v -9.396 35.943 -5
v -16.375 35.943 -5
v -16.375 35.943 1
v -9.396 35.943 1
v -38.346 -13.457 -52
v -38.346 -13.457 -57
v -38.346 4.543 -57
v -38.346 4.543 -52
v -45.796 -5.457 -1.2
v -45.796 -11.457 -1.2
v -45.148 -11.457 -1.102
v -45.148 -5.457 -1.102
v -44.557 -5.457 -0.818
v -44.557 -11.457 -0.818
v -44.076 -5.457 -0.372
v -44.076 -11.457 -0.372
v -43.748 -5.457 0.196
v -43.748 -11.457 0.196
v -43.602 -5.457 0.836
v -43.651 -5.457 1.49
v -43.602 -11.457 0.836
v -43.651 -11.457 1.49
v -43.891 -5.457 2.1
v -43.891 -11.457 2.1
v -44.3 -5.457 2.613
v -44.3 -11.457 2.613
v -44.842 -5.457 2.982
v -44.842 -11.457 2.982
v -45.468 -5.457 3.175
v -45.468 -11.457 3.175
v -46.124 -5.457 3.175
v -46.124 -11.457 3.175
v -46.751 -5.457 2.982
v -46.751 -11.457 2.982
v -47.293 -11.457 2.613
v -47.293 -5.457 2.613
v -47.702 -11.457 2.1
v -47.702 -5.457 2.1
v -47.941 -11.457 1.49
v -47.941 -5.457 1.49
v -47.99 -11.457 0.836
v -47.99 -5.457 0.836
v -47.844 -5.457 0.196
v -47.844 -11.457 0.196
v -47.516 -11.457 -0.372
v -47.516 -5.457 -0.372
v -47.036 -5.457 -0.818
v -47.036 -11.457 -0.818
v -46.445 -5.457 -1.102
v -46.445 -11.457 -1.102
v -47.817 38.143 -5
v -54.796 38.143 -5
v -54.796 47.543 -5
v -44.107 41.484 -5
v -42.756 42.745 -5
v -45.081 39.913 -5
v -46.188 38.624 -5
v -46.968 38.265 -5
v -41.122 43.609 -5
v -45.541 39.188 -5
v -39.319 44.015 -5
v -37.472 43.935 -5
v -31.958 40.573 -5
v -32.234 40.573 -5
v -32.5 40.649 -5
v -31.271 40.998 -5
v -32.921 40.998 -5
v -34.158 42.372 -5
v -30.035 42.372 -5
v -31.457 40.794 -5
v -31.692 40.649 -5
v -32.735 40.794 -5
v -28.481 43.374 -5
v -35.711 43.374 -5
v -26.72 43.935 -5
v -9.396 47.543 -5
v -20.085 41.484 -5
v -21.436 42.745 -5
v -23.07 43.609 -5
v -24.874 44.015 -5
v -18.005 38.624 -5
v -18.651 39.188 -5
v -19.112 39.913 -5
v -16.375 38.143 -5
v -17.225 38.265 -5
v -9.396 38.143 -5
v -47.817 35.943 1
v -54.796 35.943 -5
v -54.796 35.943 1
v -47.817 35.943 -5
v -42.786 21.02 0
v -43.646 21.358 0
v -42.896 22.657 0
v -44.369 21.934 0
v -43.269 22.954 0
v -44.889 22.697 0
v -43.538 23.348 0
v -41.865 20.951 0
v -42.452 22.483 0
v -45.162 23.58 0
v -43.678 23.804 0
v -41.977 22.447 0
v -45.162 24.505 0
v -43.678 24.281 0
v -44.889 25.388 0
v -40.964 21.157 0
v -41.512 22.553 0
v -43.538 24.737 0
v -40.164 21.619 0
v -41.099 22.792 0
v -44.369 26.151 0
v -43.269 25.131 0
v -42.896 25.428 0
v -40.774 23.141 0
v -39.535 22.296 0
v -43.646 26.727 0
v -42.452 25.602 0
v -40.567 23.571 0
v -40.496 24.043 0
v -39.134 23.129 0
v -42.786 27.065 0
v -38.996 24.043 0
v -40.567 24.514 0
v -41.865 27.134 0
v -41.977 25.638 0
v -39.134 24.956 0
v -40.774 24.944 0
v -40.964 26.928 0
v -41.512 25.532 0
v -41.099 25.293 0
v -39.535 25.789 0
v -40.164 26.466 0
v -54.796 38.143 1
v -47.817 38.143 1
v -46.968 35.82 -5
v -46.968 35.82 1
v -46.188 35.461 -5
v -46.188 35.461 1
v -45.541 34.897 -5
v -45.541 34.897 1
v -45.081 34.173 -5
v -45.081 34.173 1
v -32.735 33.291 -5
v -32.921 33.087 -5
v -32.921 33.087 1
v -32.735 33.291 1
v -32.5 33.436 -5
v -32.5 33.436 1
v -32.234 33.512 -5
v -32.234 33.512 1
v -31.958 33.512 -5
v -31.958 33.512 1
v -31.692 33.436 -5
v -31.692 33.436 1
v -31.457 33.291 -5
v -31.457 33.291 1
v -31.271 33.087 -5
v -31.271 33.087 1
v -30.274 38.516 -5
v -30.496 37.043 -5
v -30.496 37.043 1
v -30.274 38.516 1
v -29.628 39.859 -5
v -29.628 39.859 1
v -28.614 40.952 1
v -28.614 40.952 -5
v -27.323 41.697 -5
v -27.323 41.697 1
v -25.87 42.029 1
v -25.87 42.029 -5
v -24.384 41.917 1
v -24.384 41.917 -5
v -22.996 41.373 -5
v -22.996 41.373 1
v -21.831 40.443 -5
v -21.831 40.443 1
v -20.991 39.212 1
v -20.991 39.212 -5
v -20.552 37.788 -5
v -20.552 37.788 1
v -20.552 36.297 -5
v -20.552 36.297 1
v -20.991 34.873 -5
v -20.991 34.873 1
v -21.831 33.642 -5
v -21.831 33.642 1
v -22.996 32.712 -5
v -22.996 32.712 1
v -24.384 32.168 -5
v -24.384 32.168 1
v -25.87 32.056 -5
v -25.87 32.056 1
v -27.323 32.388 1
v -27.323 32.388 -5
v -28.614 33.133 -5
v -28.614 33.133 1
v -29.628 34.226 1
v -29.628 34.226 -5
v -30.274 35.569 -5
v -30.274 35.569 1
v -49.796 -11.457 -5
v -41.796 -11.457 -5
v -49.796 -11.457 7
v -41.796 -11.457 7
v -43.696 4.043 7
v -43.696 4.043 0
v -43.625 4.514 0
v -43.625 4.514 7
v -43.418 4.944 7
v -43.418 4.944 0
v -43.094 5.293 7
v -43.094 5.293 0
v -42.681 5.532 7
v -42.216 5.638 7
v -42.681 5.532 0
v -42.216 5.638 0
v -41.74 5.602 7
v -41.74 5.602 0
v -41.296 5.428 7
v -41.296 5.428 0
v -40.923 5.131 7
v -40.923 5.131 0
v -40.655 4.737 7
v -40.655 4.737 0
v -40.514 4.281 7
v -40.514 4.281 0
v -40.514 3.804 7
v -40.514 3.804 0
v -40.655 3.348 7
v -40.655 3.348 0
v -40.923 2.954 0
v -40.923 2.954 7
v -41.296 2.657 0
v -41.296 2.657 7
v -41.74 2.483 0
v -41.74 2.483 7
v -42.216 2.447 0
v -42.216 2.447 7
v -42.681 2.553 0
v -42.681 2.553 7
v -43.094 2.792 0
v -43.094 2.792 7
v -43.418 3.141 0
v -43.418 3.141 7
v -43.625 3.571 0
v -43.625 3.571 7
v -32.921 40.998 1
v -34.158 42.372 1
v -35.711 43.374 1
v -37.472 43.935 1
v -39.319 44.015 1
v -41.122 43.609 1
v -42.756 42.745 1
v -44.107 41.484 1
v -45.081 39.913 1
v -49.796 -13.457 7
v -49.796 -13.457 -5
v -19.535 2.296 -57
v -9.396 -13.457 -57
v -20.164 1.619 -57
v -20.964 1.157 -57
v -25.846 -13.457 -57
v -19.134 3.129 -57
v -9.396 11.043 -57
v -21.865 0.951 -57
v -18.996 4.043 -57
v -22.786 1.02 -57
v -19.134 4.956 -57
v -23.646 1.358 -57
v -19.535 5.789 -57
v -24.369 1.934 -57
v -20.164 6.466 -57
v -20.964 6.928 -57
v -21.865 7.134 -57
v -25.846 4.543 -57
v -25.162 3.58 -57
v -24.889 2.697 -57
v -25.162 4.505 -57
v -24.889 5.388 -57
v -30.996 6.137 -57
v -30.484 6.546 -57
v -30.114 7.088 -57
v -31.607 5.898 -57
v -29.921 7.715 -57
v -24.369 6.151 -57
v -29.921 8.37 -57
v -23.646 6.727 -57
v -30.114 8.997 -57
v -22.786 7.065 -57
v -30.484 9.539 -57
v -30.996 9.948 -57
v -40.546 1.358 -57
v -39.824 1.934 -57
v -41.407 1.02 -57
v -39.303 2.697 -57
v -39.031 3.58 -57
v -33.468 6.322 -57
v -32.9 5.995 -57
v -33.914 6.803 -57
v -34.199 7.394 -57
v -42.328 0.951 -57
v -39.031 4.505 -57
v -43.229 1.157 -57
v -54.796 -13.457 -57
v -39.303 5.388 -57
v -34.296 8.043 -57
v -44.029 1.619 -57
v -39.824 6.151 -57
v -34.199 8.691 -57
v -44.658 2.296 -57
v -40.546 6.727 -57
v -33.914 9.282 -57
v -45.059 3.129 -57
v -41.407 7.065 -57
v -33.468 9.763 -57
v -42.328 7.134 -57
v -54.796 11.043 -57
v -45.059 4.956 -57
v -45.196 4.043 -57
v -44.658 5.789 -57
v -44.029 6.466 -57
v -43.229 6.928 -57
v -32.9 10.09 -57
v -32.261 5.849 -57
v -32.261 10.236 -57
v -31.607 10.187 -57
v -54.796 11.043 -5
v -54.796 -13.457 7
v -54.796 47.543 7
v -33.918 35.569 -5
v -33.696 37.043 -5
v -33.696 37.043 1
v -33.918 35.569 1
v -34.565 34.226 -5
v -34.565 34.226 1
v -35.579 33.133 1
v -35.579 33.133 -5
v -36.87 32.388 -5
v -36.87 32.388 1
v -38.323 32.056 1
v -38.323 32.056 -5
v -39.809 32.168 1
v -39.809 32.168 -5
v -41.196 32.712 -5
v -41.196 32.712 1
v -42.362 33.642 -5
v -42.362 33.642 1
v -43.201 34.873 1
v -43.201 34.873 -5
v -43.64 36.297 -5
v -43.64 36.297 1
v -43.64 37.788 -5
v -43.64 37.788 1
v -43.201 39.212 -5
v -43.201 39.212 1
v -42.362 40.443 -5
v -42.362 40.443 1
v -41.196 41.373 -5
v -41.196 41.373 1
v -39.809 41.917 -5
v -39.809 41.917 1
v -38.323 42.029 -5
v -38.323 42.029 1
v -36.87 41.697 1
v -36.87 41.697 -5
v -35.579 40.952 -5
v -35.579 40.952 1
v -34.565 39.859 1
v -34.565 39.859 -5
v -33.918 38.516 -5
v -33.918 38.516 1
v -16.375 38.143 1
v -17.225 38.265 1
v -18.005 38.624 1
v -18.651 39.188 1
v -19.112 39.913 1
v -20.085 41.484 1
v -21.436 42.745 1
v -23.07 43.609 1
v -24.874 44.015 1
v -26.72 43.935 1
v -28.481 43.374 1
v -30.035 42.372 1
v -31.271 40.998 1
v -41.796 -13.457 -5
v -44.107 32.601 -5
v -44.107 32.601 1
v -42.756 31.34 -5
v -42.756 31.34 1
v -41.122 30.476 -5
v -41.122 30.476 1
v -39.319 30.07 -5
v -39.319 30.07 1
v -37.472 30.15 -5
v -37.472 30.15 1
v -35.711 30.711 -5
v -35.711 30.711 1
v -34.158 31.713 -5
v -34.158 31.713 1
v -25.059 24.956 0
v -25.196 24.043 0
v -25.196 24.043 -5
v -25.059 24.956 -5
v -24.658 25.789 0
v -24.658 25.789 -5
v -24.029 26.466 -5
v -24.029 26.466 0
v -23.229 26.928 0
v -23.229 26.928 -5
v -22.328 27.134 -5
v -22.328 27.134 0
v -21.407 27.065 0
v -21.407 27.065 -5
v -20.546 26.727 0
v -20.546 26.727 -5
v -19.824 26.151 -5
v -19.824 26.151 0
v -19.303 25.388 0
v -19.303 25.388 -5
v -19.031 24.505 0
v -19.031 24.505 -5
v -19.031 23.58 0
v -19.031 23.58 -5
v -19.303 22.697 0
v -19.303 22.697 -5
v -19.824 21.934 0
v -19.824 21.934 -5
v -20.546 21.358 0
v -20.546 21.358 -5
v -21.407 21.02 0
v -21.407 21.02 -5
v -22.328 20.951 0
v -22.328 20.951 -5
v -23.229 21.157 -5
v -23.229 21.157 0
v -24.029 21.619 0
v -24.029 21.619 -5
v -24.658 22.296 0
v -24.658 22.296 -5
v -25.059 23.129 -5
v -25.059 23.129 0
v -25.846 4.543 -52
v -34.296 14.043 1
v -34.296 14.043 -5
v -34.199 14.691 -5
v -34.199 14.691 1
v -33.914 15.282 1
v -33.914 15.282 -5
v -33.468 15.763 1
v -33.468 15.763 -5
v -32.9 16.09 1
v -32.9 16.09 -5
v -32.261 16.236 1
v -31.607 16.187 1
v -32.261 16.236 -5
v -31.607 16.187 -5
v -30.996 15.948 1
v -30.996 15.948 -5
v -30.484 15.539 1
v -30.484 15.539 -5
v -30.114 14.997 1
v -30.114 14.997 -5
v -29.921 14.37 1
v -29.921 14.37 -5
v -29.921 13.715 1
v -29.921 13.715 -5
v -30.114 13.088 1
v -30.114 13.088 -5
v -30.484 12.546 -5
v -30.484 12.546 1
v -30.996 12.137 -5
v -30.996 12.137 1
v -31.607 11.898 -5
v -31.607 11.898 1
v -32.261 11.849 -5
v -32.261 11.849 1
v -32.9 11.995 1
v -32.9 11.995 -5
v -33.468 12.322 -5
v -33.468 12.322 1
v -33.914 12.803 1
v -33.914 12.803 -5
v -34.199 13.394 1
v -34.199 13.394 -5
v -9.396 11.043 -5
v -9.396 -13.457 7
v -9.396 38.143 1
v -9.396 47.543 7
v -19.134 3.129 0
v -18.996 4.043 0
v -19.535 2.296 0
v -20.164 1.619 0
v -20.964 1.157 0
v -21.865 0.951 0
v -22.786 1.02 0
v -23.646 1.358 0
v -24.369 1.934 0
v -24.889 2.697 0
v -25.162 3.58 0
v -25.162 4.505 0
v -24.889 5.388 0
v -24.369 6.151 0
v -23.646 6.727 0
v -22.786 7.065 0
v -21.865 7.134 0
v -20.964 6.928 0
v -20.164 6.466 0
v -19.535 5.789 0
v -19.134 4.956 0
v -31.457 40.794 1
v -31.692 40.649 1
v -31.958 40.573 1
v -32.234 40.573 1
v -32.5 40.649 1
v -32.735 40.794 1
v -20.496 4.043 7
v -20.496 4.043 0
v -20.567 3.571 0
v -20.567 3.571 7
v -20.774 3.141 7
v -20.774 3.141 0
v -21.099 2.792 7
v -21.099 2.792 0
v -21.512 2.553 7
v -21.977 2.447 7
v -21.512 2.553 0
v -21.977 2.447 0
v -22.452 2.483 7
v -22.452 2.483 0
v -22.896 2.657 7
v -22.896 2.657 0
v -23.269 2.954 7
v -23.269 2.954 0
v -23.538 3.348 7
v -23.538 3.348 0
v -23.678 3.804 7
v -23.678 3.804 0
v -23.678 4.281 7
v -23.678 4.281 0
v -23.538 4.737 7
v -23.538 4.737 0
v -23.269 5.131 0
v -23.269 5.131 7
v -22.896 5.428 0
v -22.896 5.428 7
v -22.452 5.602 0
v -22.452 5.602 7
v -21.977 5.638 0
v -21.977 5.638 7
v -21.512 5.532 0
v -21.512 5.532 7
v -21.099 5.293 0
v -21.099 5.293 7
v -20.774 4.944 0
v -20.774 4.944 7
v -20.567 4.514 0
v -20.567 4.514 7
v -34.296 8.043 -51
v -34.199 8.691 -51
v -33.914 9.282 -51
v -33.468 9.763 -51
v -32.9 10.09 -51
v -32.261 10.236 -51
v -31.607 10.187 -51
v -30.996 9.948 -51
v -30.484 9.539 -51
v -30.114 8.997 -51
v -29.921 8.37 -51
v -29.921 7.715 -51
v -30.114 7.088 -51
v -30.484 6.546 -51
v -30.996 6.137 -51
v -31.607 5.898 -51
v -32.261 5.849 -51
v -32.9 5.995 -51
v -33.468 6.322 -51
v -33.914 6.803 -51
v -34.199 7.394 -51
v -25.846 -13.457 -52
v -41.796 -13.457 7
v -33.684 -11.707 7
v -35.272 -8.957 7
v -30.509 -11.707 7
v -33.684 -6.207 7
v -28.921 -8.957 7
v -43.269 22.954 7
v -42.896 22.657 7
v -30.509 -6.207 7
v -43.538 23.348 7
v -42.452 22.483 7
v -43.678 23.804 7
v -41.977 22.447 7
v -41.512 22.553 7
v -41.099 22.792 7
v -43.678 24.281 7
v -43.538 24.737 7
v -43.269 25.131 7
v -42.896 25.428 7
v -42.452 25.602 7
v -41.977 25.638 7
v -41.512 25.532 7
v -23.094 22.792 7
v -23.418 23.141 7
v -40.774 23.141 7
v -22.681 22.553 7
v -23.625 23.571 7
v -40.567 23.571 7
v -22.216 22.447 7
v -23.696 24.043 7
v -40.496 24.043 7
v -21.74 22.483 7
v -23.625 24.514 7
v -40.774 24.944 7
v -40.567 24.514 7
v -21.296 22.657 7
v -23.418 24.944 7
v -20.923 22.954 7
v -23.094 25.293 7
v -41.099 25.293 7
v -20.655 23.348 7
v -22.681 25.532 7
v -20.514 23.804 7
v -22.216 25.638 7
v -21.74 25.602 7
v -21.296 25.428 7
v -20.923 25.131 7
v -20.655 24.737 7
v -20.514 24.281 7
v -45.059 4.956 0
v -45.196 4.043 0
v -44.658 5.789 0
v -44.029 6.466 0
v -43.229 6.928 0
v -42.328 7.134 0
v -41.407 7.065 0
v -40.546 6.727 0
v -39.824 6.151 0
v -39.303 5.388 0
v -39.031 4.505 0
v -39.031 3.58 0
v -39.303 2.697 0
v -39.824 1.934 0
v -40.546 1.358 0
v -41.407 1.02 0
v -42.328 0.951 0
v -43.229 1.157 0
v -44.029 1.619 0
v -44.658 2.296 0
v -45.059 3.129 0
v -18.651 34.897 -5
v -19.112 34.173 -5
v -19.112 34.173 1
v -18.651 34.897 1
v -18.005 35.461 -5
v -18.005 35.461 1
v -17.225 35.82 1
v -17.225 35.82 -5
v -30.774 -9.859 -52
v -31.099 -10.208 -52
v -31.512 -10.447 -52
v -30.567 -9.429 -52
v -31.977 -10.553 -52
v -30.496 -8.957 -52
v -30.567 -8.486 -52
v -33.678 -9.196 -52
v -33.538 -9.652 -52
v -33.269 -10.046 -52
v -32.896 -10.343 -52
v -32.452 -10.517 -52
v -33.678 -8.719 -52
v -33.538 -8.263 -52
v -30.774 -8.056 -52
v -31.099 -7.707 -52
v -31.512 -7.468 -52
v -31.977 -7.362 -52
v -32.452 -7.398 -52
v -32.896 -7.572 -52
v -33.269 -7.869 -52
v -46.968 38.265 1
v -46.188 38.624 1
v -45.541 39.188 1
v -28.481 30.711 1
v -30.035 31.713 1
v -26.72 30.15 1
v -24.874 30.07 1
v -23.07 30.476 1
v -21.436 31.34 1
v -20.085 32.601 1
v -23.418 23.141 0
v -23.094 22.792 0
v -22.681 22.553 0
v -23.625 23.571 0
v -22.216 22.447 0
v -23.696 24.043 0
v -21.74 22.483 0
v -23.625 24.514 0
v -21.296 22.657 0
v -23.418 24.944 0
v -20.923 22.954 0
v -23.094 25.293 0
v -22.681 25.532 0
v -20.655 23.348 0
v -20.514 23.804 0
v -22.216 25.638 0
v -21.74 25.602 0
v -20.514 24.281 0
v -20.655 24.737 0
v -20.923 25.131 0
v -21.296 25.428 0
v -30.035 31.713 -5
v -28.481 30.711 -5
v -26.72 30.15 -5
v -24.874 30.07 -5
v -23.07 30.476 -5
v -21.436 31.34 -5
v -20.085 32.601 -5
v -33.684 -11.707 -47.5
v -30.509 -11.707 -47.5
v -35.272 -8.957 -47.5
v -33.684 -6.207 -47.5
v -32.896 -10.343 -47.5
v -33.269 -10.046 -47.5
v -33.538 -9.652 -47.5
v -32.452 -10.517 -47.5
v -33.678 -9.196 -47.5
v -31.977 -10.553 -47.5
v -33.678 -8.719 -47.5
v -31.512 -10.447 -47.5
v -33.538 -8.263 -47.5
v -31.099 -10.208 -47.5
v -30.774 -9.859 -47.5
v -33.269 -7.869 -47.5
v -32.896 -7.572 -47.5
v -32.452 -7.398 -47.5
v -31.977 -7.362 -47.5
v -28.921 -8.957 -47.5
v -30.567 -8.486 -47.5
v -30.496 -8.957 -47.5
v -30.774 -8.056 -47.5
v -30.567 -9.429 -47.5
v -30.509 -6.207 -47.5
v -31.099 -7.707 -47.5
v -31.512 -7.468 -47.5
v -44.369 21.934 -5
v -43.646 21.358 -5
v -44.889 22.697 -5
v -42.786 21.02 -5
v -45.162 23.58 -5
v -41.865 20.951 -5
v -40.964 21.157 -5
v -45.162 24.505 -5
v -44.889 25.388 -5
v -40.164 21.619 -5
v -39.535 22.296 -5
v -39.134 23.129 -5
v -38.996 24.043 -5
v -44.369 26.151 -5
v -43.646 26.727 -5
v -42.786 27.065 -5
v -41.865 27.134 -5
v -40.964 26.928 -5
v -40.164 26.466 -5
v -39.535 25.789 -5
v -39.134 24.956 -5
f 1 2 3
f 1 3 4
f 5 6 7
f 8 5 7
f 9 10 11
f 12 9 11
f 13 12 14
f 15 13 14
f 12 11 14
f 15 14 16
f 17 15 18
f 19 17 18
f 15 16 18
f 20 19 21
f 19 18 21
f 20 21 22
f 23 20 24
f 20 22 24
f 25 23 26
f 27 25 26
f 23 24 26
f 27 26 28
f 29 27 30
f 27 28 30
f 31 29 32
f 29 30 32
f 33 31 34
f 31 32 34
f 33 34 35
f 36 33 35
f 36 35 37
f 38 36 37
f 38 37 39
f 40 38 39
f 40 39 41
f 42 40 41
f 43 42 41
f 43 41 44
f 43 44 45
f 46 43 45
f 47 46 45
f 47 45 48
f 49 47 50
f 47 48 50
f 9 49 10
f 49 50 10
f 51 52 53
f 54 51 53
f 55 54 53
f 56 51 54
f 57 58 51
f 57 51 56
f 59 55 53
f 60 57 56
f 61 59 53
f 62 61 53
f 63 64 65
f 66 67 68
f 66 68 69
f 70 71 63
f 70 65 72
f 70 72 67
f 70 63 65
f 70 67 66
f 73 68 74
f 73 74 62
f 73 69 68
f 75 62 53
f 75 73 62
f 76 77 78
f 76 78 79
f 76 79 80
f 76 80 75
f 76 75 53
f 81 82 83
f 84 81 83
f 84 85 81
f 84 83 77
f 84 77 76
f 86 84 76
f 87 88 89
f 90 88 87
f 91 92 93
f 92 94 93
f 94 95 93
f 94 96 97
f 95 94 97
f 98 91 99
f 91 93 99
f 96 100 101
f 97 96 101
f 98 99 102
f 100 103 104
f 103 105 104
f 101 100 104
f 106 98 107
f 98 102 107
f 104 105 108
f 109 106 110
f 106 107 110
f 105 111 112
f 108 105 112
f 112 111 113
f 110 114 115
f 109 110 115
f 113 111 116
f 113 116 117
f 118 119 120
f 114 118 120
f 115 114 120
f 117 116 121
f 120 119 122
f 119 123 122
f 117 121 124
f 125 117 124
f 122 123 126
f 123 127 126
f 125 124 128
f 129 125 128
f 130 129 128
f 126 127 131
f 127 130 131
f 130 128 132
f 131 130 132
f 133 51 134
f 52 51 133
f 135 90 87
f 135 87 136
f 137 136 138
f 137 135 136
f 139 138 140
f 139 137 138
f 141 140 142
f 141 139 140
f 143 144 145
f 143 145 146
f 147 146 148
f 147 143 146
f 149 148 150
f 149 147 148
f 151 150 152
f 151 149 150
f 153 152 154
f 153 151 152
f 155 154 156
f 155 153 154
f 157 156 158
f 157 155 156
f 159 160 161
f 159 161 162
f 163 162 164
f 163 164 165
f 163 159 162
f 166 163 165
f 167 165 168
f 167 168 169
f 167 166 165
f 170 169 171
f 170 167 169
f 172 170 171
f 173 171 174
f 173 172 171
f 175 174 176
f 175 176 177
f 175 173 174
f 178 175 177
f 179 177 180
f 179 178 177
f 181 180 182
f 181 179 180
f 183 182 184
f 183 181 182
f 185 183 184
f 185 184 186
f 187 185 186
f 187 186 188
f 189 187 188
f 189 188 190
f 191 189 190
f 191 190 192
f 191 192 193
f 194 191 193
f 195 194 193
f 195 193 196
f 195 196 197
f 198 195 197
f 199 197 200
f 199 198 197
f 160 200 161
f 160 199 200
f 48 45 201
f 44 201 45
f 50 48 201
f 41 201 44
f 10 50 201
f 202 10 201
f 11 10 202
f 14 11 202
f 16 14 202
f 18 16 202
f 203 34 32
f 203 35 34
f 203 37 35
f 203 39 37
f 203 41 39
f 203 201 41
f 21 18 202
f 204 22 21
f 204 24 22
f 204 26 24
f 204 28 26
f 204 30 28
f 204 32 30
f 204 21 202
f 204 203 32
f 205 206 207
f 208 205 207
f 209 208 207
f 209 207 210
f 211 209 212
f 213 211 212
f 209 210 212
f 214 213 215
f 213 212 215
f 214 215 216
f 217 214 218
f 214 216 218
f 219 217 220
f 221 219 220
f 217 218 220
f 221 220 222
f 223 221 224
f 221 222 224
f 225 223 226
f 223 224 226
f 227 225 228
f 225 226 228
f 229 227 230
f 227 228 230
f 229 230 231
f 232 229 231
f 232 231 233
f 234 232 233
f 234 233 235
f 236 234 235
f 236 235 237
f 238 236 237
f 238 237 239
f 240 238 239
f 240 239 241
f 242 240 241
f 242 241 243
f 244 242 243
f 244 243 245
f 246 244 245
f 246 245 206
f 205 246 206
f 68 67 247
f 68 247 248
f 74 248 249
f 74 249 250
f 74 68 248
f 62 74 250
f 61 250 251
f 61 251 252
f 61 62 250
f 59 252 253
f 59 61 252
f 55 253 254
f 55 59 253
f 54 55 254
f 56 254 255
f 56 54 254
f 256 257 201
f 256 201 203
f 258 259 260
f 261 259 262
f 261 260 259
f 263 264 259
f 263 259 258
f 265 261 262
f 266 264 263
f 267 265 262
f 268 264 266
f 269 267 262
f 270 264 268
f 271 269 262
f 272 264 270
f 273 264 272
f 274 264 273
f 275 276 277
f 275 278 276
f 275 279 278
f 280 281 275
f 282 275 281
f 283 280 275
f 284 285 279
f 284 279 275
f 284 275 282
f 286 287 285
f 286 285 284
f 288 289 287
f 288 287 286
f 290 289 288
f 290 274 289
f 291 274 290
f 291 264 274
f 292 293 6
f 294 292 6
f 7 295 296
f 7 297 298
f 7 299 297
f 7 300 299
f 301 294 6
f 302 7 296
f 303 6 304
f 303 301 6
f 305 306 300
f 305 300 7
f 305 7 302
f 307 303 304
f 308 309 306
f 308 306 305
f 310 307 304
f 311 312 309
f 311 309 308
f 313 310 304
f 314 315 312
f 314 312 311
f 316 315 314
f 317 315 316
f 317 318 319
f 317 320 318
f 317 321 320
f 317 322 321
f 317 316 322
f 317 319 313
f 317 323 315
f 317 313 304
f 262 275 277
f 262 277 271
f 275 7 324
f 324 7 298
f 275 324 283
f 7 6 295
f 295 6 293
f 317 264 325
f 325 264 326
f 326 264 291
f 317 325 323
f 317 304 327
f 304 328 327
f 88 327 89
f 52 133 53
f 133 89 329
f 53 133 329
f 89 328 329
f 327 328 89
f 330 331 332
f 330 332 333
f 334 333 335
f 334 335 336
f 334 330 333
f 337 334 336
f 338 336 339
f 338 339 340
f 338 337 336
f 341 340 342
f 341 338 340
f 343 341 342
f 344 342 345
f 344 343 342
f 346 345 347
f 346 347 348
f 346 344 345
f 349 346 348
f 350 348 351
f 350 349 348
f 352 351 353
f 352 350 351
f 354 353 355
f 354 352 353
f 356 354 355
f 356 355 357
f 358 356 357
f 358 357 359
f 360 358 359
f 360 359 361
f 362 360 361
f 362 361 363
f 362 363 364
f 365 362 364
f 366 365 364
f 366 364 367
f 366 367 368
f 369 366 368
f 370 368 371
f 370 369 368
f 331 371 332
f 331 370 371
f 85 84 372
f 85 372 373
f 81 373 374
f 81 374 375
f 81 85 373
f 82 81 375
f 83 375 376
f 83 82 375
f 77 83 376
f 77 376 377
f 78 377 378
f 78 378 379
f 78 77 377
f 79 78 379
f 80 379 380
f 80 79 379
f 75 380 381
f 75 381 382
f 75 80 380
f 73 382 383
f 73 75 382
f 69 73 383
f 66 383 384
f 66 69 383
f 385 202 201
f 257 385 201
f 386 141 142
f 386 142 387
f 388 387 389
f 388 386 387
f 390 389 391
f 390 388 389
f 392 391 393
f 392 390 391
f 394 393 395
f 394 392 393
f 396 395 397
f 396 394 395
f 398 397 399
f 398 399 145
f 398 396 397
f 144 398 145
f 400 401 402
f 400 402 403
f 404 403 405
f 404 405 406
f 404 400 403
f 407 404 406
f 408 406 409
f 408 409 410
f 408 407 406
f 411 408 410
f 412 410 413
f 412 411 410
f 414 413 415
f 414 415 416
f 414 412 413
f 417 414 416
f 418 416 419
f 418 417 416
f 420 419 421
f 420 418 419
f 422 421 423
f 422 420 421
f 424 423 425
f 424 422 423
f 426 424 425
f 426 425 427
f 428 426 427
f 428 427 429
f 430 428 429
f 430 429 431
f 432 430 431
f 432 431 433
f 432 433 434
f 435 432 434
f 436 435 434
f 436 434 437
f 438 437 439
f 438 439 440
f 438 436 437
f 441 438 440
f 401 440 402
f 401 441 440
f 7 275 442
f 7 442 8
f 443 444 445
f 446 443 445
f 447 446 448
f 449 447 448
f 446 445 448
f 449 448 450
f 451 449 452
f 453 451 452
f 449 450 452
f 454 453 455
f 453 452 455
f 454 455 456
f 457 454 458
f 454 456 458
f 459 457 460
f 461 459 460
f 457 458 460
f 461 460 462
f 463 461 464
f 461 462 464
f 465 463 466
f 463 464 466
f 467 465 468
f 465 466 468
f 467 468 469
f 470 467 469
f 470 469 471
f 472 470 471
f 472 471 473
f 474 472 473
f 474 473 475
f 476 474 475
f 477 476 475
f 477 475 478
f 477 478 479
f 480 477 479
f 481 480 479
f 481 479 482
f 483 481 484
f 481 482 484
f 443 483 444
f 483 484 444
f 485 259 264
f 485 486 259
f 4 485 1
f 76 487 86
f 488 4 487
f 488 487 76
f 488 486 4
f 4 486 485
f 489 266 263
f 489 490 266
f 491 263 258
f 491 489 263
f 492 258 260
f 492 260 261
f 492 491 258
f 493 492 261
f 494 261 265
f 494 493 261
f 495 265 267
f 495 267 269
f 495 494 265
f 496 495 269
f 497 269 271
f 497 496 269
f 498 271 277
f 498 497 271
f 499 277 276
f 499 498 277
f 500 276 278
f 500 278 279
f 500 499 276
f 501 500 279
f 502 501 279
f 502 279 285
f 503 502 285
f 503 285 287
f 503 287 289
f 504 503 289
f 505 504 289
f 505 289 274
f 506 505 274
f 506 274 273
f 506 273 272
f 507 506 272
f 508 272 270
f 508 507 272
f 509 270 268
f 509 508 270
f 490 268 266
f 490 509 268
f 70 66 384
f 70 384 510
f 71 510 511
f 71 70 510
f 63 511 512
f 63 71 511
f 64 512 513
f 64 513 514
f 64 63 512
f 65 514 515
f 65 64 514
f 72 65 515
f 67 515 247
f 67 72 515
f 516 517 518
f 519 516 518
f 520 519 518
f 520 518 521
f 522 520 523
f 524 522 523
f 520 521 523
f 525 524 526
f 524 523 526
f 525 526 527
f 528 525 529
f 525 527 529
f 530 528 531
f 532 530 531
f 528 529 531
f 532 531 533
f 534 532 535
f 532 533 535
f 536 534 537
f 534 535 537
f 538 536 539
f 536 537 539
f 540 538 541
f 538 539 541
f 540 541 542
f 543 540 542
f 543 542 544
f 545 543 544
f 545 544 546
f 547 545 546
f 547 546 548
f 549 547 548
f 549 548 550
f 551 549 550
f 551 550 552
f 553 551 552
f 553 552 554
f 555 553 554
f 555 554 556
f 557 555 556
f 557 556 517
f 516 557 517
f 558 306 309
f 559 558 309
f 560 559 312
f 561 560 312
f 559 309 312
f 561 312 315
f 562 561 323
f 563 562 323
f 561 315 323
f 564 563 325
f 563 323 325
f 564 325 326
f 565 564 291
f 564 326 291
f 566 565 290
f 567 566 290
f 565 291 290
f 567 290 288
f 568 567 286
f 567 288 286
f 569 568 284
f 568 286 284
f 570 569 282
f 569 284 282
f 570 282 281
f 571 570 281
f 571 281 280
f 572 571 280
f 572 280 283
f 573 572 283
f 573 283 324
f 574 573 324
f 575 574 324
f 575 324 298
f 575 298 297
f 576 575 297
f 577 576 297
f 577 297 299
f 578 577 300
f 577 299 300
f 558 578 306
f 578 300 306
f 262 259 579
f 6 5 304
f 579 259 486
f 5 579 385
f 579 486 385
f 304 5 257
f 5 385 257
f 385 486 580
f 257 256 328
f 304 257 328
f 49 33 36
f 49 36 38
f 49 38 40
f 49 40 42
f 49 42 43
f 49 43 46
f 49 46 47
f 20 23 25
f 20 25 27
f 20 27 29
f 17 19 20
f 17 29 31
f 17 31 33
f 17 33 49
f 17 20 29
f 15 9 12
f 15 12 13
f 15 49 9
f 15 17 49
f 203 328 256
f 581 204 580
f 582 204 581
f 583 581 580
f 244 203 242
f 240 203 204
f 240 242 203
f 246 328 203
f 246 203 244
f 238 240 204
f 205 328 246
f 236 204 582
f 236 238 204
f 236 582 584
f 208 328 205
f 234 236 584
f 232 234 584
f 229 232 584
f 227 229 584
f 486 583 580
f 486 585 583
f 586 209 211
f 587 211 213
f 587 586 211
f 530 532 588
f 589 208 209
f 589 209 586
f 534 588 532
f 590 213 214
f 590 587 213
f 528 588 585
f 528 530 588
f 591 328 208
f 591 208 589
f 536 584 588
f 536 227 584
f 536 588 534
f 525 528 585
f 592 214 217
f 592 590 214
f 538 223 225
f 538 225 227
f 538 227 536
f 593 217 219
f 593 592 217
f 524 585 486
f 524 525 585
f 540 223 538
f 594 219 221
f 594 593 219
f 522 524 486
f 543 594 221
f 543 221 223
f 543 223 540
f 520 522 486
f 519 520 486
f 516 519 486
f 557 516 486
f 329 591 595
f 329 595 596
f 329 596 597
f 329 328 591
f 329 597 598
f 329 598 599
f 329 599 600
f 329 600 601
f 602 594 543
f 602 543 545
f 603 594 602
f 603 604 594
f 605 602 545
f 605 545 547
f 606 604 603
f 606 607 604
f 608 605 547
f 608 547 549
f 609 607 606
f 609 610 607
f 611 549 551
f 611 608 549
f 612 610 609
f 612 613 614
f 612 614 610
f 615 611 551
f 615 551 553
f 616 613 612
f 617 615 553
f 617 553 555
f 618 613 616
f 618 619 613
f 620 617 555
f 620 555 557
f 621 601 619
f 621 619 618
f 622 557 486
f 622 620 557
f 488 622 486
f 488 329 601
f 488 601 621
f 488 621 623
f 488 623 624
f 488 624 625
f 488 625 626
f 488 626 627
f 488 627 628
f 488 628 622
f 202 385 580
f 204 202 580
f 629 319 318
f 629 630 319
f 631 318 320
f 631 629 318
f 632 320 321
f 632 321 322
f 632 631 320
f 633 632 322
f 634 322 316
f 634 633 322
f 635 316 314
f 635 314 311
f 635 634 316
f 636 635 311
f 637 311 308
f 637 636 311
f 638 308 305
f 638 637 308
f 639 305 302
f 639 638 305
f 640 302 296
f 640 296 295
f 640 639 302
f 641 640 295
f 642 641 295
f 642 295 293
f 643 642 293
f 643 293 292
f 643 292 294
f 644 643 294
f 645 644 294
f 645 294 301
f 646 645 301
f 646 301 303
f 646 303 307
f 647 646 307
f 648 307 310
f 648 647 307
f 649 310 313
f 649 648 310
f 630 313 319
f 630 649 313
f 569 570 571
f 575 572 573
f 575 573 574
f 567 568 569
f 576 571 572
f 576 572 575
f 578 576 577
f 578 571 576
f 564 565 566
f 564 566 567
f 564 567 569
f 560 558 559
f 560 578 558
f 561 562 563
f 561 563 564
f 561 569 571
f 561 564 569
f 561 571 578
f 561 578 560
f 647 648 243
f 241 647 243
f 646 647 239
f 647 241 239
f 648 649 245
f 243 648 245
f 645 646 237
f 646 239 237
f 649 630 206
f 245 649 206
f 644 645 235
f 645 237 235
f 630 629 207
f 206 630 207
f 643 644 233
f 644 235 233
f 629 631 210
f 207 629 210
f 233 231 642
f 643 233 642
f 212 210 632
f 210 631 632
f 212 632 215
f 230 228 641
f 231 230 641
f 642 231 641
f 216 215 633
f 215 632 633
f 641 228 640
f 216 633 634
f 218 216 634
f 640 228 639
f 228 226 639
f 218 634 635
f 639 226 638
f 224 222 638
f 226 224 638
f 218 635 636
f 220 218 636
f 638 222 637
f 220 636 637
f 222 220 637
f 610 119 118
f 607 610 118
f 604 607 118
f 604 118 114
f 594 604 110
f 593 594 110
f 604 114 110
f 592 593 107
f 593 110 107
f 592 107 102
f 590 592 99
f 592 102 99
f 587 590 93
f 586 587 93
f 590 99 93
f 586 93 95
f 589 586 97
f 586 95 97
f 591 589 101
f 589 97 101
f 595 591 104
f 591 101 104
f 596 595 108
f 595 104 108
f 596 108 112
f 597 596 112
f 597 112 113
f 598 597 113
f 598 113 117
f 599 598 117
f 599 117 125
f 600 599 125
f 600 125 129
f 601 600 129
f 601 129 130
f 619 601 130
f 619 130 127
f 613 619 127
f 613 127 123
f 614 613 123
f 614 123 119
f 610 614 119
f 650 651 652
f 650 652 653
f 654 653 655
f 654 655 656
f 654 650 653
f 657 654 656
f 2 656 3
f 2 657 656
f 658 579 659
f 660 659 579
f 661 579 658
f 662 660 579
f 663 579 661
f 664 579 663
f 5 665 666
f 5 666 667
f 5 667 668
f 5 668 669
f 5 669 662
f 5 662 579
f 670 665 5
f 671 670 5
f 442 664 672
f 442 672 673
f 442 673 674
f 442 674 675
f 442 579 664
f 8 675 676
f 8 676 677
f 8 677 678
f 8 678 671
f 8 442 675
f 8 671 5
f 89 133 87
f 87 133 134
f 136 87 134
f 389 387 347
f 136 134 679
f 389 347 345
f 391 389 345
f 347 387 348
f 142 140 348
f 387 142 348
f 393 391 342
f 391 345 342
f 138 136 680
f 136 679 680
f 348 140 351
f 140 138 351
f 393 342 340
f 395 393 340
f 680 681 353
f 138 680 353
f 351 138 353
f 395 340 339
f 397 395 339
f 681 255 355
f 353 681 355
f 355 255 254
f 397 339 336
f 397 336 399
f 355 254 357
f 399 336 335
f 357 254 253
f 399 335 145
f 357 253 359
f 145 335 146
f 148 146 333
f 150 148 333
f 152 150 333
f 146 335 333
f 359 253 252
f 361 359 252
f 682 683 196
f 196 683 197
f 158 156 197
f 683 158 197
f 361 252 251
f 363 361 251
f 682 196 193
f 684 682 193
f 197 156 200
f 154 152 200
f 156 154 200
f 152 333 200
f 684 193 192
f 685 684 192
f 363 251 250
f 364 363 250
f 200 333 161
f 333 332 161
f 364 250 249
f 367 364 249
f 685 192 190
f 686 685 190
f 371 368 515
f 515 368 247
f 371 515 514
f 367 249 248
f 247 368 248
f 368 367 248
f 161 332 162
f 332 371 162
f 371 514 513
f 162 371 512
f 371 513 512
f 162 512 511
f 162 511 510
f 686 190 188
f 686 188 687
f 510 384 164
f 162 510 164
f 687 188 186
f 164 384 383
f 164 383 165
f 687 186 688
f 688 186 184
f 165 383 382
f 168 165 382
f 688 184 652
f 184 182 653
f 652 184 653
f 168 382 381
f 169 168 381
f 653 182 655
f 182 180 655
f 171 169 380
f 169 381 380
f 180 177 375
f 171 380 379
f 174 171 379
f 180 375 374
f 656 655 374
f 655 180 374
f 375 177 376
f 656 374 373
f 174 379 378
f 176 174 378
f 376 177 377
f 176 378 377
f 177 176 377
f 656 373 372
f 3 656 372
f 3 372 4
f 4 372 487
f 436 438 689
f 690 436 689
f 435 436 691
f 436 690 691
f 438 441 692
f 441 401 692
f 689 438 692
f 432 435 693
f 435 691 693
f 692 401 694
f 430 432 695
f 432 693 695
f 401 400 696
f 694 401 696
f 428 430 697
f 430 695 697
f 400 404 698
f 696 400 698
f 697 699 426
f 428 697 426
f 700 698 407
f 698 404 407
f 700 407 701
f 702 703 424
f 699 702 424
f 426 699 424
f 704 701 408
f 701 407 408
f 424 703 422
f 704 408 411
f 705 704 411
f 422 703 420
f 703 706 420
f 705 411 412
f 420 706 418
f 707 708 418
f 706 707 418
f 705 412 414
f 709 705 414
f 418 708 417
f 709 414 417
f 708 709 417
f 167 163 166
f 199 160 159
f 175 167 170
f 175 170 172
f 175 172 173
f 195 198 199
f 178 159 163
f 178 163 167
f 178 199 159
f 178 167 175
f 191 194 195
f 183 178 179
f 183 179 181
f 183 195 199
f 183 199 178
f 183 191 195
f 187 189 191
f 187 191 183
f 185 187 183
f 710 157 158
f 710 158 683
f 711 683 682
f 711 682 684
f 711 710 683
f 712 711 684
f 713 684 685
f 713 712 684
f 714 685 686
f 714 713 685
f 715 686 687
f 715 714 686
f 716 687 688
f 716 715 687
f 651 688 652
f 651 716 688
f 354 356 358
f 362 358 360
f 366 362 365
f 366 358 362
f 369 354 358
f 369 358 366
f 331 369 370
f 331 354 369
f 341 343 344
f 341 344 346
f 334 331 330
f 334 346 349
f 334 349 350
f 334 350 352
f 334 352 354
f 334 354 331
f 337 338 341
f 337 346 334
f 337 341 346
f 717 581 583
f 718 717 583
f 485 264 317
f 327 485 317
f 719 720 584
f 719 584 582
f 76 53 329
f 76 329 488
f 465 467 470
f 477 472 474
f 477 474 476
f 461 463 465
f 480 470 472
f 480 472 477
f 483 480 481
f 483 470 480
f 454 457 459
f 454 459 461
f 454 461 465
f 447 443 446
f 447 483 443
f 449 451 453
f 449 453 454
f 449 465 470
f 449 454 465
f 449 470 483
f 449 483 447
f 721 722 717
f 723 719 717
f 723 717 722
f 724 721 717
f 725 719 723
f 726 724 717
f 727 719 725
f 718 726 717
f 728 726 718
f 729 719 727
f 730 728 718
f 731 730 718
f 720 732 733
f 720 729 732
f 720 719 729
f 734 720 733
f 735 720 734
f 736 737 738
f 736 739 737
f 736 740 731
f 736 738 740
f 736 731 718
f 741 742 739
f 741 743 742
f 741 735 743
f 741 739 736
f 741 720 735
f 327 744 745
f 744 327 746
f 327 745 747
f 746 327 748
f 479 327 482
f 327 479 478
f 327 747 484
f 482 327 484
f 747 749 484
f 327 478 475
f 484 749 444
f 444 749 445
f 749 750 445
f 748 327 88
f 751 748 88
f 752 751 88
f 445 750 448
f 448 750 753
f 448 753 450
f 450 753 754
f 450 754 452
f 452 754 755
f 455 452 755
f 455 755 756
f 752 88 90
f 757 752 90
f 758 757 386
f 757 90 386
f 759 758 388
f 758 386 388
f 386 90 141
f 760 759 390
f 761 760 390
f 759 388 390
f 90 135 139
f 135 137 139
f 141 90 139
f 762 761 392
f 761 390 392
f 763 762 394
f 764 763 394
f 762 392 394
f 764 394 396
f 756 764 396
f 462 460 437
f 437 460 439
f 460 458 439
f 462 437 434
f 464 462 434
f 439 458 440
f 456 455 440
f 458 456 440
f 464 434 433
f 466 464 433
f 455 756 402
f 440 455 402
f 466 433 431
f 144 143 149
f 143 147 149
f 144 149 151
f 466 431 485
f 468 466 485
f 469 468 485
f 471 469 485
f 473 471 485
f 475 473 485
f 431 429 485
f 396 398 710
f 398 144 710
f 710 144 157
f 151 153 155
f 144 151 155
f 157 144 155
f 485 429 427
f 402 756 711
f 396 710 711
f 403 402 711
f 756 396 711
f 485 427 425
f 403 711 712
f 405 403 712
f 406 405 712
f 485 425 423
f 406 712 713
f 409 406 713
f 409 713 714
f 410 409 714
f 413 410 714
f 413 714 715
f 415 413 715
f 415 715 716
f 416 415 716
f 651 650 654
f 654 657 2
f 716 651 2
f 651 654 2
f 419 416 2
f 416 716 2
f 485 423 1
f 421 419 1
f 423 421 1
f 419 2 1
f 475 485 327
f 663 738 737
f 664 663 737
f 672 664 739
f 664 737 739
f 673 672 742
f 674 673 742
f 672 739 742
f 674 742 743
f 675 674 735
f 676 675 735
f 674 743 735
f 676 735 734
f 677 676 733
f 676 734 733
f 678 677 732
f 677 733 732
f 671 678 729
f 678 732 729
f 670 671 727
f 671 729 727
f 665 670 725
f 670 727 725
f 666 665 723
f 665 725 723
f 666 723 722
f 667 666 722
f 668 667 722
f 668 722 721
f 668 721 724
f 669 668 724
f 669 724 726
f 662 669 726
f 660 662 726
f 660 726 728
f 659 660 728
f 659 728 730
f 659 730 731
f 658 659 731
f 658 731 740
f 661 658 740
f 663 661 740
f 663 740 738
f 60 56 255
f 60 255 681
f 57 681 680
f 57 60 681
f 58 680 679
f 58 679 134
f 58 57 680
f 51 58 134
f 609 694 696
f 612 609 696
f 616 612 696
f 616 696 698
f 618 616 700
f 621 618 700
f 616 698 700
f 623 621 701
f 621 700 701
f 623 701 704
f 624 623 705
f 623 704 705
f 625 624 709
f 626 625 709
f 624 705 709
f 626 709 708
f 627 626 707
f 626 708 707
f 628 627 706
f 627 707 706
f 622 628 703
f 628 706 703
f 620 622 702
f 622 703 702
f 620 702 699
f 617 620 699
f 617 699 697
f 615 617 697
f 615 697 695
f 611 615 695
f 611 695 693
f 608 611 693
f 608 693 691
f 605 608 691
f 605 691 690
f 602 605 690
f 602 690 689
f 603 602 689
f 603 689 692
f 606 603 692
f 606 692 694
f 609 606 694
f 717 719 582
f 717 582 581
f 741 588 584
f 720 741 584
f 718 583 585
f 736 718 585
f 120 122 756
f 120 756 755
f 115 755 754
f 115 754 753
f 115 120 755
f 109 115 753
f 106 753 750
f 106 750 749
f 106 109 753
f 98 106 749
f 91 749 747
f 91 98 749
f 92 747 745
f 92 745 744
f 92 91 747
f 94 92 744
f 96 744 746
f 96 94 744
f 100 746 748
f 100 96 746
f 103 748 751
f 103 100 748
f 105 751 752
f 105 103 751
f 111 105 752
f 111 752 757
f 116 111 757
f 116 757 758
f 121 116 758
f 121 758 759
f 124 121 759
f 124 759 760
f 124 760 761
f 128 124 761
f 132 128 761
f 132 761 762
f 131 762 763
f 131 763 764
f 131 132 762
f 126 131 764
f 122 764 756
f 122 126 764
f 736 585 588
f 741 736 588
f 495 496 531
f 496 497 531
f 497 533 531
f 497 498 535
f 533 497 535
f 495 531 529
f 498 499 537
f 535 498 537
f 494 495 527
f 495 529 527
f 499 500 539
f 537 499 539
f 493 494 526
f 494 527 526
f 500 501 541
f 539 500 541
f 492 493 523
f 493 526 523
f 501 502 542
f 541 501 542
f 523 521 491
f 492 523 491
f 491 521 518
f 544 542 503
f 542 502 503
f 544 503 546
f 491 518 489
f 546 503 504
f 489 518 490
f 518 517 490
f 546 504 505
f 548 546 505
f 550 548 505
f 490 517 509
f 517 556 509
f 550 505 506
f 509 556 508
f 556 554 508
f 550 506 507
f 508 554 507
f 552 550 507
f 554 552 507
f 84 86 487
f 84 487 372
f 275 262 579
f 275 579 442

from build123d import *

# Parameters (mm, degrees)
SKETCH_1_W           = 45.4
SKETCH_1_H           = 27
EXTRUDE_1_DEPTH      = 7
SKETCH_2_R           = 1.6
CUT_EXTRUDE_1_DEPTH  = 62.727033531
SKETCH_4_R           = 3.1
EXTRUDE_2_DEPTH      = 5
SKETCH_5_W           = 45.4
SKETCH_5_H           = 12
EXTRUDE_3_DEPTH      = 20
SKETCH_7_R           = 5
CUT_EXTRUDE_3_DEPTH  = 6
EXTRUDE_4_DEPTH      = 14
SKETCH_10_W          = 8
SKETCH_10_H          = 12
CUT_EXTRUDE_6_DEPTH  = 2
SKETCH_12_R          = 2.2
CUT_EXTRUDE_8_DEPTH  = 6
SKETCH_13_R          = 2.2
CUT_EXTRUDE_9_DEPTH  = 6
SKETCH_14_W          = 45.4
SKETCH_14_H          = 24.5
SKETCH_14_R          = 3.1
EXTRUDE_5_DEPTH      = 52
SKETCH_15_W          = 12.5
SKETCH_15_H          = 36
CUT_EXTRUDE_10_DEPTH = 5
SKETCH_9_R           = 1.6
CUT_EXTRUDE_4_DEPTH  = 97.741548345
CUT_EXTRUDE_5_DEPTH  = 54.5
SKETCH_16_R          = 2.2
CUT_EXTRUDE_11_DEPTH = 6


with BuildPart() as part:
    # 草图1 → 凸台-拉伸1 (new body)
    with BuildSketch(Plane.XY):
        with Locations((-32.096319797, 14.04251269)):
            Rectangle(SKETCH_1_W, SKETCH_1_H)
    extrude(amount=EXTRUDE_1_DEPTH)

    # 草图2 → 切除-拉伸1 (cut, through all)
    with BuildSketch(Plane(origin=(0, 0, 0), x_dir=(-1, 0, 0), z_dir=(0, 0, -1))):
        with Locations((22.096319797, 24.04251269)):
            Circle(SKETCH_2_R)
        with Locations(Location((42.096319797, 24.04251269, 0), (0, 0, 180))):
            Circle(SKETCH_2_R)
        with Locations((42.096319797, 4.04251269)):
            Circle(SKETCH_2_R)
        with Locations(Location((22.096319797, 4.04251269, 0), (0, 0, 180))):
            Circle(SKETCH_2_R)
    extrude(amount=-CUT_EXTRUDE_1_DEPTH, mode=Mode.SUBTRACT)

    # 草图4 → 凸台-拉伸2 (add)
    with BuildSketch(Plane(origin=(0, 0, 0), x_dir=(-1, 0, 0), z_dir=(0, 0, -1))):
        Polygon((38.346319797, 0.54251269), (54.796319797, 0.54251269), (54.796319797, 27.54251269), (9.396319797, 27.54251269), (9.396319797, 0.54251269), (25.846319797, 0.54251269), align=None)
        with Locations(Location((42.096319797, 24.04251269, 0), (0, 0, 180))):
            Circle(SKETCH_4_R, mode=Mode.SUBTRACT)
        with Locations((22.096319797, 24.04251269)):
            Circle(SKETCH_4_R, mode=Mode.SUBTRACT)
        with Locations((42.096319797, 4.04251269)):
            Circle(SKETCH_4_R, mode=Mode.SUBTRACT)
        with Locations(Location((22.096319797, 4.04251269, 0), (0, 0, 180))):
            Circle(SKETCH_4_R, mode=Mode.SUBTRACT)
    extrude(amount=EXTRUDE_2_DEPTH)

    # 草图5 → 凸台-拉伸3 (add)
    with BuildSketch(Plane(origin=(0, 27.54251269, 0), x_dir=(1, 0, 0), z_dir=(0, 1, 0))):
        with Locations((-32.096319797, -1)):
            Rectangle(SKETCH_5_W, SKETCH_5_H)
    extrude(amount=EXTRUDE_3_DEPTH)

    # 草图7 → 切除-拉伸3 (cut)
    with BuildSketch(Plane(origin=(0, 0, -5), x_dir=(-1, 0, 0), z_dir=(0, 0, -1))):
        with BuildLine():
            Line((9.396319797, 38.14251269), (16.375464574, 38.14251269))
            ThreePointArc((16.375464574, 38.14251269), (18.004881648, 38.623584347), (19.111721141, 39.91251269))
            ThreePointArc((19.111721141, 39.91251269), (24.873653651, 44.014763896), (31.271319797, 40.998441785))
            ThreePointArc((31.271319797, 40.998441785), (32.096319797, 40.563574513), (32.921319797, 40.998441785))
            ThreePointArc((32.921319797, 40.998441785), (39.318985943, 44.014763896), (45.080918453, 39.91251269))
            ThreePointArc((45.080918453, 39.91251269), (46.187757946, 38.623584347), (47.81717502, 38.14251269))
            Line((47.81717502, 38.14251269), (54.796319797, 38.14251269))
            Line((54.796319797, 38.14251269), (54.796319797, 35.94251269))
            Line((54.796319797, 35.94251269), (47.81717502, 35.94251269))
            ThreePointArc((47.81717502, 35.94251269), (46.187757946, 35.461441034), (45.080918453, 34.17251269))
            ThreePointArc((45.080918453, 34.17251269), (39.318985943, 30.070261485), (32.921319797, 33.086583596))
            ThreePointArc((32.921319797, 33.086583596), (32.096319797, 33.521450868), (31.271319797, 33.086583596))
            ThreePointArc((31.271319797, 33.086583596), (24.873653651, 30.070261485), (19.111721141, 34.17251269))
            ThreePointArc((19.111721141, 34.17251269), (18.004881648, 35.461441034), (16.375464574, 35.94251269))
            Line((16.375464574, 35.94251269), (9.396319797, 35.94251269))
            Line((9.396319797, 35.94251269), (9.396319797, 38.14251269))
        make_face()
        with Locations((25.496319797, 37.04251269)):
            Circle(SKETCH_7_R, mode=Mode.SUBTRACT)
        with Locations(Location((38.696319797, 37.04251269, 0), (0, 0, 180))):
            Circle(SKETCH_7_R, mode=Mode.SUBTRACT)
    extrude(amount=-CUT_EXTRUDE_3_DEPTH, mode=Mode.SUBTRACT)

    # 草图8 → 凸台-拉伸4 (add)
    with BuildSketch(Plane.XZ.offset(-0.54251269)):
        Polygon((-54.796319797, 7), (-9.396319797, 7), (-9.396319797, -5), (-25.846319797, -5), (-38.346319797, -5), (-54.796319797, -5), align=None)
    extrude(amount=EXTRUDE_4_DEPTH)

    # 草图10 → 切除-拉伸6 (cut)
    with BuildSketch(Plane.XZ.offset(13.45748731)):
        with Locations((-45.796319797, 1)):
            Rectangle(SKETCH_10_W, SKETCH_10_H)
    extrude(amount=-CUT_EXTRUDE_6_DEPTH, mode=Mode.SUBTRACT)

    # 草图12 → 切除-拉伸8 (cut)
    with BuildSketch(Plane.XZ.offset(11.45748731)):
        with Locations(Location((-45.796319797, 1, 0), (0, 0, 270))):
            Circle(SKETCH_12_R)
    extrude(amount=-CUT_EXTRUDE_8_DEPTH, mode=Mode.SUBTRACT)

    # 草图13 → 切除-拉伸9 (cut)
    with BuildSketch(Plane(origin=(0, 0, -5), x_dir=(-1, 0, 0), z_dir=(0, 0, -1))):
        with Locations((32.096319797, 14.04251269)):
            Circle(SKETCH_13_R)
    extrude(amount=-CUT_EXTRUDE_9_DEPTH, mode=Mode.SUBTRACT)

    # 草图14 → 凸台-拉伸5 (add)
    with BuildSketch(Plane(origin=(0, 0, -5), x_dir=(-1, 0, 0), z_dir=(0, 0, -1))):
        with Locations((32.096319797, -1.20748731)):
            Rectangle(SKETCH_14_W, SKETCH_14_H)
        with Locations(Location((22.096319797, 4.04251269, 0), (0, 0, 180))):
            Circle(SKETCH_14_R, mode=Mode.SUBTRACT)
        with Locations((42.096319797, 4.04251269)):
            Circle(SKETCH_14_R, mode=Mode.SUBTRACT)
    extrude(amount=EXTRUDE_5_DEPTH)

    # 草图15 → 切除-拉伸10 (cut)
    with BuildSketch(Plane(origin=(0, 0, -57), x_dir=(-1, 0, 0), z_dir=(0, 0, -1))):
        with Locations((32.096319797, -13.45748731)):
            Rectangle(SKETCH_15_W, SKETCH_15_H)
    extrude(amount=-CUT_EXTRUDE_10_DEPTH, mode=Mode.SUBTRACT)

    # 草图9 → 切除-拉伸4 (cut, through all)
    with BuildSketch(Plane.XY.offset(7)):
        with Locations((-32.096319797, -8.95748731)):
            Circle(SKETCH_9_R)
    extrude(amount=-CUT_EXTRUDE_4_DEPTH, mode=Mode.SUBTRACT)

    # 草图3 → 切除-拉伸5 (cut)
    with BuildSketch(Plane.XY.offset(7)):
        Polygon((-28.920893316, -8.95748731), (-30.508606557, -6.20748731), (-33.684033037, -6.20748731), (-35.271746277, -8.95748731), (-33.684033037, -11.70748731), (-30.508606557, -11.70748731), align=None)
    extrude(amount=-CUT_EXTRUDE_5_DEPTH, mode=Mode.SUBTRACT)

    # 草图16 → 切除-拉伸11 (cut)
    with BuildSketch(Plane(origin=(0, 0, -57), x_dir=(-1, 0, 0), z_dir=(0, 0, -1))):
        with Locations((32.096319797, 8.04251269)):
            Circle(SKETCH_16_R)
    extrude(amount=-CUT_EXTRUDE_11_DEPTH, mode=Mode.SUBTRACT)


solid = part.part
